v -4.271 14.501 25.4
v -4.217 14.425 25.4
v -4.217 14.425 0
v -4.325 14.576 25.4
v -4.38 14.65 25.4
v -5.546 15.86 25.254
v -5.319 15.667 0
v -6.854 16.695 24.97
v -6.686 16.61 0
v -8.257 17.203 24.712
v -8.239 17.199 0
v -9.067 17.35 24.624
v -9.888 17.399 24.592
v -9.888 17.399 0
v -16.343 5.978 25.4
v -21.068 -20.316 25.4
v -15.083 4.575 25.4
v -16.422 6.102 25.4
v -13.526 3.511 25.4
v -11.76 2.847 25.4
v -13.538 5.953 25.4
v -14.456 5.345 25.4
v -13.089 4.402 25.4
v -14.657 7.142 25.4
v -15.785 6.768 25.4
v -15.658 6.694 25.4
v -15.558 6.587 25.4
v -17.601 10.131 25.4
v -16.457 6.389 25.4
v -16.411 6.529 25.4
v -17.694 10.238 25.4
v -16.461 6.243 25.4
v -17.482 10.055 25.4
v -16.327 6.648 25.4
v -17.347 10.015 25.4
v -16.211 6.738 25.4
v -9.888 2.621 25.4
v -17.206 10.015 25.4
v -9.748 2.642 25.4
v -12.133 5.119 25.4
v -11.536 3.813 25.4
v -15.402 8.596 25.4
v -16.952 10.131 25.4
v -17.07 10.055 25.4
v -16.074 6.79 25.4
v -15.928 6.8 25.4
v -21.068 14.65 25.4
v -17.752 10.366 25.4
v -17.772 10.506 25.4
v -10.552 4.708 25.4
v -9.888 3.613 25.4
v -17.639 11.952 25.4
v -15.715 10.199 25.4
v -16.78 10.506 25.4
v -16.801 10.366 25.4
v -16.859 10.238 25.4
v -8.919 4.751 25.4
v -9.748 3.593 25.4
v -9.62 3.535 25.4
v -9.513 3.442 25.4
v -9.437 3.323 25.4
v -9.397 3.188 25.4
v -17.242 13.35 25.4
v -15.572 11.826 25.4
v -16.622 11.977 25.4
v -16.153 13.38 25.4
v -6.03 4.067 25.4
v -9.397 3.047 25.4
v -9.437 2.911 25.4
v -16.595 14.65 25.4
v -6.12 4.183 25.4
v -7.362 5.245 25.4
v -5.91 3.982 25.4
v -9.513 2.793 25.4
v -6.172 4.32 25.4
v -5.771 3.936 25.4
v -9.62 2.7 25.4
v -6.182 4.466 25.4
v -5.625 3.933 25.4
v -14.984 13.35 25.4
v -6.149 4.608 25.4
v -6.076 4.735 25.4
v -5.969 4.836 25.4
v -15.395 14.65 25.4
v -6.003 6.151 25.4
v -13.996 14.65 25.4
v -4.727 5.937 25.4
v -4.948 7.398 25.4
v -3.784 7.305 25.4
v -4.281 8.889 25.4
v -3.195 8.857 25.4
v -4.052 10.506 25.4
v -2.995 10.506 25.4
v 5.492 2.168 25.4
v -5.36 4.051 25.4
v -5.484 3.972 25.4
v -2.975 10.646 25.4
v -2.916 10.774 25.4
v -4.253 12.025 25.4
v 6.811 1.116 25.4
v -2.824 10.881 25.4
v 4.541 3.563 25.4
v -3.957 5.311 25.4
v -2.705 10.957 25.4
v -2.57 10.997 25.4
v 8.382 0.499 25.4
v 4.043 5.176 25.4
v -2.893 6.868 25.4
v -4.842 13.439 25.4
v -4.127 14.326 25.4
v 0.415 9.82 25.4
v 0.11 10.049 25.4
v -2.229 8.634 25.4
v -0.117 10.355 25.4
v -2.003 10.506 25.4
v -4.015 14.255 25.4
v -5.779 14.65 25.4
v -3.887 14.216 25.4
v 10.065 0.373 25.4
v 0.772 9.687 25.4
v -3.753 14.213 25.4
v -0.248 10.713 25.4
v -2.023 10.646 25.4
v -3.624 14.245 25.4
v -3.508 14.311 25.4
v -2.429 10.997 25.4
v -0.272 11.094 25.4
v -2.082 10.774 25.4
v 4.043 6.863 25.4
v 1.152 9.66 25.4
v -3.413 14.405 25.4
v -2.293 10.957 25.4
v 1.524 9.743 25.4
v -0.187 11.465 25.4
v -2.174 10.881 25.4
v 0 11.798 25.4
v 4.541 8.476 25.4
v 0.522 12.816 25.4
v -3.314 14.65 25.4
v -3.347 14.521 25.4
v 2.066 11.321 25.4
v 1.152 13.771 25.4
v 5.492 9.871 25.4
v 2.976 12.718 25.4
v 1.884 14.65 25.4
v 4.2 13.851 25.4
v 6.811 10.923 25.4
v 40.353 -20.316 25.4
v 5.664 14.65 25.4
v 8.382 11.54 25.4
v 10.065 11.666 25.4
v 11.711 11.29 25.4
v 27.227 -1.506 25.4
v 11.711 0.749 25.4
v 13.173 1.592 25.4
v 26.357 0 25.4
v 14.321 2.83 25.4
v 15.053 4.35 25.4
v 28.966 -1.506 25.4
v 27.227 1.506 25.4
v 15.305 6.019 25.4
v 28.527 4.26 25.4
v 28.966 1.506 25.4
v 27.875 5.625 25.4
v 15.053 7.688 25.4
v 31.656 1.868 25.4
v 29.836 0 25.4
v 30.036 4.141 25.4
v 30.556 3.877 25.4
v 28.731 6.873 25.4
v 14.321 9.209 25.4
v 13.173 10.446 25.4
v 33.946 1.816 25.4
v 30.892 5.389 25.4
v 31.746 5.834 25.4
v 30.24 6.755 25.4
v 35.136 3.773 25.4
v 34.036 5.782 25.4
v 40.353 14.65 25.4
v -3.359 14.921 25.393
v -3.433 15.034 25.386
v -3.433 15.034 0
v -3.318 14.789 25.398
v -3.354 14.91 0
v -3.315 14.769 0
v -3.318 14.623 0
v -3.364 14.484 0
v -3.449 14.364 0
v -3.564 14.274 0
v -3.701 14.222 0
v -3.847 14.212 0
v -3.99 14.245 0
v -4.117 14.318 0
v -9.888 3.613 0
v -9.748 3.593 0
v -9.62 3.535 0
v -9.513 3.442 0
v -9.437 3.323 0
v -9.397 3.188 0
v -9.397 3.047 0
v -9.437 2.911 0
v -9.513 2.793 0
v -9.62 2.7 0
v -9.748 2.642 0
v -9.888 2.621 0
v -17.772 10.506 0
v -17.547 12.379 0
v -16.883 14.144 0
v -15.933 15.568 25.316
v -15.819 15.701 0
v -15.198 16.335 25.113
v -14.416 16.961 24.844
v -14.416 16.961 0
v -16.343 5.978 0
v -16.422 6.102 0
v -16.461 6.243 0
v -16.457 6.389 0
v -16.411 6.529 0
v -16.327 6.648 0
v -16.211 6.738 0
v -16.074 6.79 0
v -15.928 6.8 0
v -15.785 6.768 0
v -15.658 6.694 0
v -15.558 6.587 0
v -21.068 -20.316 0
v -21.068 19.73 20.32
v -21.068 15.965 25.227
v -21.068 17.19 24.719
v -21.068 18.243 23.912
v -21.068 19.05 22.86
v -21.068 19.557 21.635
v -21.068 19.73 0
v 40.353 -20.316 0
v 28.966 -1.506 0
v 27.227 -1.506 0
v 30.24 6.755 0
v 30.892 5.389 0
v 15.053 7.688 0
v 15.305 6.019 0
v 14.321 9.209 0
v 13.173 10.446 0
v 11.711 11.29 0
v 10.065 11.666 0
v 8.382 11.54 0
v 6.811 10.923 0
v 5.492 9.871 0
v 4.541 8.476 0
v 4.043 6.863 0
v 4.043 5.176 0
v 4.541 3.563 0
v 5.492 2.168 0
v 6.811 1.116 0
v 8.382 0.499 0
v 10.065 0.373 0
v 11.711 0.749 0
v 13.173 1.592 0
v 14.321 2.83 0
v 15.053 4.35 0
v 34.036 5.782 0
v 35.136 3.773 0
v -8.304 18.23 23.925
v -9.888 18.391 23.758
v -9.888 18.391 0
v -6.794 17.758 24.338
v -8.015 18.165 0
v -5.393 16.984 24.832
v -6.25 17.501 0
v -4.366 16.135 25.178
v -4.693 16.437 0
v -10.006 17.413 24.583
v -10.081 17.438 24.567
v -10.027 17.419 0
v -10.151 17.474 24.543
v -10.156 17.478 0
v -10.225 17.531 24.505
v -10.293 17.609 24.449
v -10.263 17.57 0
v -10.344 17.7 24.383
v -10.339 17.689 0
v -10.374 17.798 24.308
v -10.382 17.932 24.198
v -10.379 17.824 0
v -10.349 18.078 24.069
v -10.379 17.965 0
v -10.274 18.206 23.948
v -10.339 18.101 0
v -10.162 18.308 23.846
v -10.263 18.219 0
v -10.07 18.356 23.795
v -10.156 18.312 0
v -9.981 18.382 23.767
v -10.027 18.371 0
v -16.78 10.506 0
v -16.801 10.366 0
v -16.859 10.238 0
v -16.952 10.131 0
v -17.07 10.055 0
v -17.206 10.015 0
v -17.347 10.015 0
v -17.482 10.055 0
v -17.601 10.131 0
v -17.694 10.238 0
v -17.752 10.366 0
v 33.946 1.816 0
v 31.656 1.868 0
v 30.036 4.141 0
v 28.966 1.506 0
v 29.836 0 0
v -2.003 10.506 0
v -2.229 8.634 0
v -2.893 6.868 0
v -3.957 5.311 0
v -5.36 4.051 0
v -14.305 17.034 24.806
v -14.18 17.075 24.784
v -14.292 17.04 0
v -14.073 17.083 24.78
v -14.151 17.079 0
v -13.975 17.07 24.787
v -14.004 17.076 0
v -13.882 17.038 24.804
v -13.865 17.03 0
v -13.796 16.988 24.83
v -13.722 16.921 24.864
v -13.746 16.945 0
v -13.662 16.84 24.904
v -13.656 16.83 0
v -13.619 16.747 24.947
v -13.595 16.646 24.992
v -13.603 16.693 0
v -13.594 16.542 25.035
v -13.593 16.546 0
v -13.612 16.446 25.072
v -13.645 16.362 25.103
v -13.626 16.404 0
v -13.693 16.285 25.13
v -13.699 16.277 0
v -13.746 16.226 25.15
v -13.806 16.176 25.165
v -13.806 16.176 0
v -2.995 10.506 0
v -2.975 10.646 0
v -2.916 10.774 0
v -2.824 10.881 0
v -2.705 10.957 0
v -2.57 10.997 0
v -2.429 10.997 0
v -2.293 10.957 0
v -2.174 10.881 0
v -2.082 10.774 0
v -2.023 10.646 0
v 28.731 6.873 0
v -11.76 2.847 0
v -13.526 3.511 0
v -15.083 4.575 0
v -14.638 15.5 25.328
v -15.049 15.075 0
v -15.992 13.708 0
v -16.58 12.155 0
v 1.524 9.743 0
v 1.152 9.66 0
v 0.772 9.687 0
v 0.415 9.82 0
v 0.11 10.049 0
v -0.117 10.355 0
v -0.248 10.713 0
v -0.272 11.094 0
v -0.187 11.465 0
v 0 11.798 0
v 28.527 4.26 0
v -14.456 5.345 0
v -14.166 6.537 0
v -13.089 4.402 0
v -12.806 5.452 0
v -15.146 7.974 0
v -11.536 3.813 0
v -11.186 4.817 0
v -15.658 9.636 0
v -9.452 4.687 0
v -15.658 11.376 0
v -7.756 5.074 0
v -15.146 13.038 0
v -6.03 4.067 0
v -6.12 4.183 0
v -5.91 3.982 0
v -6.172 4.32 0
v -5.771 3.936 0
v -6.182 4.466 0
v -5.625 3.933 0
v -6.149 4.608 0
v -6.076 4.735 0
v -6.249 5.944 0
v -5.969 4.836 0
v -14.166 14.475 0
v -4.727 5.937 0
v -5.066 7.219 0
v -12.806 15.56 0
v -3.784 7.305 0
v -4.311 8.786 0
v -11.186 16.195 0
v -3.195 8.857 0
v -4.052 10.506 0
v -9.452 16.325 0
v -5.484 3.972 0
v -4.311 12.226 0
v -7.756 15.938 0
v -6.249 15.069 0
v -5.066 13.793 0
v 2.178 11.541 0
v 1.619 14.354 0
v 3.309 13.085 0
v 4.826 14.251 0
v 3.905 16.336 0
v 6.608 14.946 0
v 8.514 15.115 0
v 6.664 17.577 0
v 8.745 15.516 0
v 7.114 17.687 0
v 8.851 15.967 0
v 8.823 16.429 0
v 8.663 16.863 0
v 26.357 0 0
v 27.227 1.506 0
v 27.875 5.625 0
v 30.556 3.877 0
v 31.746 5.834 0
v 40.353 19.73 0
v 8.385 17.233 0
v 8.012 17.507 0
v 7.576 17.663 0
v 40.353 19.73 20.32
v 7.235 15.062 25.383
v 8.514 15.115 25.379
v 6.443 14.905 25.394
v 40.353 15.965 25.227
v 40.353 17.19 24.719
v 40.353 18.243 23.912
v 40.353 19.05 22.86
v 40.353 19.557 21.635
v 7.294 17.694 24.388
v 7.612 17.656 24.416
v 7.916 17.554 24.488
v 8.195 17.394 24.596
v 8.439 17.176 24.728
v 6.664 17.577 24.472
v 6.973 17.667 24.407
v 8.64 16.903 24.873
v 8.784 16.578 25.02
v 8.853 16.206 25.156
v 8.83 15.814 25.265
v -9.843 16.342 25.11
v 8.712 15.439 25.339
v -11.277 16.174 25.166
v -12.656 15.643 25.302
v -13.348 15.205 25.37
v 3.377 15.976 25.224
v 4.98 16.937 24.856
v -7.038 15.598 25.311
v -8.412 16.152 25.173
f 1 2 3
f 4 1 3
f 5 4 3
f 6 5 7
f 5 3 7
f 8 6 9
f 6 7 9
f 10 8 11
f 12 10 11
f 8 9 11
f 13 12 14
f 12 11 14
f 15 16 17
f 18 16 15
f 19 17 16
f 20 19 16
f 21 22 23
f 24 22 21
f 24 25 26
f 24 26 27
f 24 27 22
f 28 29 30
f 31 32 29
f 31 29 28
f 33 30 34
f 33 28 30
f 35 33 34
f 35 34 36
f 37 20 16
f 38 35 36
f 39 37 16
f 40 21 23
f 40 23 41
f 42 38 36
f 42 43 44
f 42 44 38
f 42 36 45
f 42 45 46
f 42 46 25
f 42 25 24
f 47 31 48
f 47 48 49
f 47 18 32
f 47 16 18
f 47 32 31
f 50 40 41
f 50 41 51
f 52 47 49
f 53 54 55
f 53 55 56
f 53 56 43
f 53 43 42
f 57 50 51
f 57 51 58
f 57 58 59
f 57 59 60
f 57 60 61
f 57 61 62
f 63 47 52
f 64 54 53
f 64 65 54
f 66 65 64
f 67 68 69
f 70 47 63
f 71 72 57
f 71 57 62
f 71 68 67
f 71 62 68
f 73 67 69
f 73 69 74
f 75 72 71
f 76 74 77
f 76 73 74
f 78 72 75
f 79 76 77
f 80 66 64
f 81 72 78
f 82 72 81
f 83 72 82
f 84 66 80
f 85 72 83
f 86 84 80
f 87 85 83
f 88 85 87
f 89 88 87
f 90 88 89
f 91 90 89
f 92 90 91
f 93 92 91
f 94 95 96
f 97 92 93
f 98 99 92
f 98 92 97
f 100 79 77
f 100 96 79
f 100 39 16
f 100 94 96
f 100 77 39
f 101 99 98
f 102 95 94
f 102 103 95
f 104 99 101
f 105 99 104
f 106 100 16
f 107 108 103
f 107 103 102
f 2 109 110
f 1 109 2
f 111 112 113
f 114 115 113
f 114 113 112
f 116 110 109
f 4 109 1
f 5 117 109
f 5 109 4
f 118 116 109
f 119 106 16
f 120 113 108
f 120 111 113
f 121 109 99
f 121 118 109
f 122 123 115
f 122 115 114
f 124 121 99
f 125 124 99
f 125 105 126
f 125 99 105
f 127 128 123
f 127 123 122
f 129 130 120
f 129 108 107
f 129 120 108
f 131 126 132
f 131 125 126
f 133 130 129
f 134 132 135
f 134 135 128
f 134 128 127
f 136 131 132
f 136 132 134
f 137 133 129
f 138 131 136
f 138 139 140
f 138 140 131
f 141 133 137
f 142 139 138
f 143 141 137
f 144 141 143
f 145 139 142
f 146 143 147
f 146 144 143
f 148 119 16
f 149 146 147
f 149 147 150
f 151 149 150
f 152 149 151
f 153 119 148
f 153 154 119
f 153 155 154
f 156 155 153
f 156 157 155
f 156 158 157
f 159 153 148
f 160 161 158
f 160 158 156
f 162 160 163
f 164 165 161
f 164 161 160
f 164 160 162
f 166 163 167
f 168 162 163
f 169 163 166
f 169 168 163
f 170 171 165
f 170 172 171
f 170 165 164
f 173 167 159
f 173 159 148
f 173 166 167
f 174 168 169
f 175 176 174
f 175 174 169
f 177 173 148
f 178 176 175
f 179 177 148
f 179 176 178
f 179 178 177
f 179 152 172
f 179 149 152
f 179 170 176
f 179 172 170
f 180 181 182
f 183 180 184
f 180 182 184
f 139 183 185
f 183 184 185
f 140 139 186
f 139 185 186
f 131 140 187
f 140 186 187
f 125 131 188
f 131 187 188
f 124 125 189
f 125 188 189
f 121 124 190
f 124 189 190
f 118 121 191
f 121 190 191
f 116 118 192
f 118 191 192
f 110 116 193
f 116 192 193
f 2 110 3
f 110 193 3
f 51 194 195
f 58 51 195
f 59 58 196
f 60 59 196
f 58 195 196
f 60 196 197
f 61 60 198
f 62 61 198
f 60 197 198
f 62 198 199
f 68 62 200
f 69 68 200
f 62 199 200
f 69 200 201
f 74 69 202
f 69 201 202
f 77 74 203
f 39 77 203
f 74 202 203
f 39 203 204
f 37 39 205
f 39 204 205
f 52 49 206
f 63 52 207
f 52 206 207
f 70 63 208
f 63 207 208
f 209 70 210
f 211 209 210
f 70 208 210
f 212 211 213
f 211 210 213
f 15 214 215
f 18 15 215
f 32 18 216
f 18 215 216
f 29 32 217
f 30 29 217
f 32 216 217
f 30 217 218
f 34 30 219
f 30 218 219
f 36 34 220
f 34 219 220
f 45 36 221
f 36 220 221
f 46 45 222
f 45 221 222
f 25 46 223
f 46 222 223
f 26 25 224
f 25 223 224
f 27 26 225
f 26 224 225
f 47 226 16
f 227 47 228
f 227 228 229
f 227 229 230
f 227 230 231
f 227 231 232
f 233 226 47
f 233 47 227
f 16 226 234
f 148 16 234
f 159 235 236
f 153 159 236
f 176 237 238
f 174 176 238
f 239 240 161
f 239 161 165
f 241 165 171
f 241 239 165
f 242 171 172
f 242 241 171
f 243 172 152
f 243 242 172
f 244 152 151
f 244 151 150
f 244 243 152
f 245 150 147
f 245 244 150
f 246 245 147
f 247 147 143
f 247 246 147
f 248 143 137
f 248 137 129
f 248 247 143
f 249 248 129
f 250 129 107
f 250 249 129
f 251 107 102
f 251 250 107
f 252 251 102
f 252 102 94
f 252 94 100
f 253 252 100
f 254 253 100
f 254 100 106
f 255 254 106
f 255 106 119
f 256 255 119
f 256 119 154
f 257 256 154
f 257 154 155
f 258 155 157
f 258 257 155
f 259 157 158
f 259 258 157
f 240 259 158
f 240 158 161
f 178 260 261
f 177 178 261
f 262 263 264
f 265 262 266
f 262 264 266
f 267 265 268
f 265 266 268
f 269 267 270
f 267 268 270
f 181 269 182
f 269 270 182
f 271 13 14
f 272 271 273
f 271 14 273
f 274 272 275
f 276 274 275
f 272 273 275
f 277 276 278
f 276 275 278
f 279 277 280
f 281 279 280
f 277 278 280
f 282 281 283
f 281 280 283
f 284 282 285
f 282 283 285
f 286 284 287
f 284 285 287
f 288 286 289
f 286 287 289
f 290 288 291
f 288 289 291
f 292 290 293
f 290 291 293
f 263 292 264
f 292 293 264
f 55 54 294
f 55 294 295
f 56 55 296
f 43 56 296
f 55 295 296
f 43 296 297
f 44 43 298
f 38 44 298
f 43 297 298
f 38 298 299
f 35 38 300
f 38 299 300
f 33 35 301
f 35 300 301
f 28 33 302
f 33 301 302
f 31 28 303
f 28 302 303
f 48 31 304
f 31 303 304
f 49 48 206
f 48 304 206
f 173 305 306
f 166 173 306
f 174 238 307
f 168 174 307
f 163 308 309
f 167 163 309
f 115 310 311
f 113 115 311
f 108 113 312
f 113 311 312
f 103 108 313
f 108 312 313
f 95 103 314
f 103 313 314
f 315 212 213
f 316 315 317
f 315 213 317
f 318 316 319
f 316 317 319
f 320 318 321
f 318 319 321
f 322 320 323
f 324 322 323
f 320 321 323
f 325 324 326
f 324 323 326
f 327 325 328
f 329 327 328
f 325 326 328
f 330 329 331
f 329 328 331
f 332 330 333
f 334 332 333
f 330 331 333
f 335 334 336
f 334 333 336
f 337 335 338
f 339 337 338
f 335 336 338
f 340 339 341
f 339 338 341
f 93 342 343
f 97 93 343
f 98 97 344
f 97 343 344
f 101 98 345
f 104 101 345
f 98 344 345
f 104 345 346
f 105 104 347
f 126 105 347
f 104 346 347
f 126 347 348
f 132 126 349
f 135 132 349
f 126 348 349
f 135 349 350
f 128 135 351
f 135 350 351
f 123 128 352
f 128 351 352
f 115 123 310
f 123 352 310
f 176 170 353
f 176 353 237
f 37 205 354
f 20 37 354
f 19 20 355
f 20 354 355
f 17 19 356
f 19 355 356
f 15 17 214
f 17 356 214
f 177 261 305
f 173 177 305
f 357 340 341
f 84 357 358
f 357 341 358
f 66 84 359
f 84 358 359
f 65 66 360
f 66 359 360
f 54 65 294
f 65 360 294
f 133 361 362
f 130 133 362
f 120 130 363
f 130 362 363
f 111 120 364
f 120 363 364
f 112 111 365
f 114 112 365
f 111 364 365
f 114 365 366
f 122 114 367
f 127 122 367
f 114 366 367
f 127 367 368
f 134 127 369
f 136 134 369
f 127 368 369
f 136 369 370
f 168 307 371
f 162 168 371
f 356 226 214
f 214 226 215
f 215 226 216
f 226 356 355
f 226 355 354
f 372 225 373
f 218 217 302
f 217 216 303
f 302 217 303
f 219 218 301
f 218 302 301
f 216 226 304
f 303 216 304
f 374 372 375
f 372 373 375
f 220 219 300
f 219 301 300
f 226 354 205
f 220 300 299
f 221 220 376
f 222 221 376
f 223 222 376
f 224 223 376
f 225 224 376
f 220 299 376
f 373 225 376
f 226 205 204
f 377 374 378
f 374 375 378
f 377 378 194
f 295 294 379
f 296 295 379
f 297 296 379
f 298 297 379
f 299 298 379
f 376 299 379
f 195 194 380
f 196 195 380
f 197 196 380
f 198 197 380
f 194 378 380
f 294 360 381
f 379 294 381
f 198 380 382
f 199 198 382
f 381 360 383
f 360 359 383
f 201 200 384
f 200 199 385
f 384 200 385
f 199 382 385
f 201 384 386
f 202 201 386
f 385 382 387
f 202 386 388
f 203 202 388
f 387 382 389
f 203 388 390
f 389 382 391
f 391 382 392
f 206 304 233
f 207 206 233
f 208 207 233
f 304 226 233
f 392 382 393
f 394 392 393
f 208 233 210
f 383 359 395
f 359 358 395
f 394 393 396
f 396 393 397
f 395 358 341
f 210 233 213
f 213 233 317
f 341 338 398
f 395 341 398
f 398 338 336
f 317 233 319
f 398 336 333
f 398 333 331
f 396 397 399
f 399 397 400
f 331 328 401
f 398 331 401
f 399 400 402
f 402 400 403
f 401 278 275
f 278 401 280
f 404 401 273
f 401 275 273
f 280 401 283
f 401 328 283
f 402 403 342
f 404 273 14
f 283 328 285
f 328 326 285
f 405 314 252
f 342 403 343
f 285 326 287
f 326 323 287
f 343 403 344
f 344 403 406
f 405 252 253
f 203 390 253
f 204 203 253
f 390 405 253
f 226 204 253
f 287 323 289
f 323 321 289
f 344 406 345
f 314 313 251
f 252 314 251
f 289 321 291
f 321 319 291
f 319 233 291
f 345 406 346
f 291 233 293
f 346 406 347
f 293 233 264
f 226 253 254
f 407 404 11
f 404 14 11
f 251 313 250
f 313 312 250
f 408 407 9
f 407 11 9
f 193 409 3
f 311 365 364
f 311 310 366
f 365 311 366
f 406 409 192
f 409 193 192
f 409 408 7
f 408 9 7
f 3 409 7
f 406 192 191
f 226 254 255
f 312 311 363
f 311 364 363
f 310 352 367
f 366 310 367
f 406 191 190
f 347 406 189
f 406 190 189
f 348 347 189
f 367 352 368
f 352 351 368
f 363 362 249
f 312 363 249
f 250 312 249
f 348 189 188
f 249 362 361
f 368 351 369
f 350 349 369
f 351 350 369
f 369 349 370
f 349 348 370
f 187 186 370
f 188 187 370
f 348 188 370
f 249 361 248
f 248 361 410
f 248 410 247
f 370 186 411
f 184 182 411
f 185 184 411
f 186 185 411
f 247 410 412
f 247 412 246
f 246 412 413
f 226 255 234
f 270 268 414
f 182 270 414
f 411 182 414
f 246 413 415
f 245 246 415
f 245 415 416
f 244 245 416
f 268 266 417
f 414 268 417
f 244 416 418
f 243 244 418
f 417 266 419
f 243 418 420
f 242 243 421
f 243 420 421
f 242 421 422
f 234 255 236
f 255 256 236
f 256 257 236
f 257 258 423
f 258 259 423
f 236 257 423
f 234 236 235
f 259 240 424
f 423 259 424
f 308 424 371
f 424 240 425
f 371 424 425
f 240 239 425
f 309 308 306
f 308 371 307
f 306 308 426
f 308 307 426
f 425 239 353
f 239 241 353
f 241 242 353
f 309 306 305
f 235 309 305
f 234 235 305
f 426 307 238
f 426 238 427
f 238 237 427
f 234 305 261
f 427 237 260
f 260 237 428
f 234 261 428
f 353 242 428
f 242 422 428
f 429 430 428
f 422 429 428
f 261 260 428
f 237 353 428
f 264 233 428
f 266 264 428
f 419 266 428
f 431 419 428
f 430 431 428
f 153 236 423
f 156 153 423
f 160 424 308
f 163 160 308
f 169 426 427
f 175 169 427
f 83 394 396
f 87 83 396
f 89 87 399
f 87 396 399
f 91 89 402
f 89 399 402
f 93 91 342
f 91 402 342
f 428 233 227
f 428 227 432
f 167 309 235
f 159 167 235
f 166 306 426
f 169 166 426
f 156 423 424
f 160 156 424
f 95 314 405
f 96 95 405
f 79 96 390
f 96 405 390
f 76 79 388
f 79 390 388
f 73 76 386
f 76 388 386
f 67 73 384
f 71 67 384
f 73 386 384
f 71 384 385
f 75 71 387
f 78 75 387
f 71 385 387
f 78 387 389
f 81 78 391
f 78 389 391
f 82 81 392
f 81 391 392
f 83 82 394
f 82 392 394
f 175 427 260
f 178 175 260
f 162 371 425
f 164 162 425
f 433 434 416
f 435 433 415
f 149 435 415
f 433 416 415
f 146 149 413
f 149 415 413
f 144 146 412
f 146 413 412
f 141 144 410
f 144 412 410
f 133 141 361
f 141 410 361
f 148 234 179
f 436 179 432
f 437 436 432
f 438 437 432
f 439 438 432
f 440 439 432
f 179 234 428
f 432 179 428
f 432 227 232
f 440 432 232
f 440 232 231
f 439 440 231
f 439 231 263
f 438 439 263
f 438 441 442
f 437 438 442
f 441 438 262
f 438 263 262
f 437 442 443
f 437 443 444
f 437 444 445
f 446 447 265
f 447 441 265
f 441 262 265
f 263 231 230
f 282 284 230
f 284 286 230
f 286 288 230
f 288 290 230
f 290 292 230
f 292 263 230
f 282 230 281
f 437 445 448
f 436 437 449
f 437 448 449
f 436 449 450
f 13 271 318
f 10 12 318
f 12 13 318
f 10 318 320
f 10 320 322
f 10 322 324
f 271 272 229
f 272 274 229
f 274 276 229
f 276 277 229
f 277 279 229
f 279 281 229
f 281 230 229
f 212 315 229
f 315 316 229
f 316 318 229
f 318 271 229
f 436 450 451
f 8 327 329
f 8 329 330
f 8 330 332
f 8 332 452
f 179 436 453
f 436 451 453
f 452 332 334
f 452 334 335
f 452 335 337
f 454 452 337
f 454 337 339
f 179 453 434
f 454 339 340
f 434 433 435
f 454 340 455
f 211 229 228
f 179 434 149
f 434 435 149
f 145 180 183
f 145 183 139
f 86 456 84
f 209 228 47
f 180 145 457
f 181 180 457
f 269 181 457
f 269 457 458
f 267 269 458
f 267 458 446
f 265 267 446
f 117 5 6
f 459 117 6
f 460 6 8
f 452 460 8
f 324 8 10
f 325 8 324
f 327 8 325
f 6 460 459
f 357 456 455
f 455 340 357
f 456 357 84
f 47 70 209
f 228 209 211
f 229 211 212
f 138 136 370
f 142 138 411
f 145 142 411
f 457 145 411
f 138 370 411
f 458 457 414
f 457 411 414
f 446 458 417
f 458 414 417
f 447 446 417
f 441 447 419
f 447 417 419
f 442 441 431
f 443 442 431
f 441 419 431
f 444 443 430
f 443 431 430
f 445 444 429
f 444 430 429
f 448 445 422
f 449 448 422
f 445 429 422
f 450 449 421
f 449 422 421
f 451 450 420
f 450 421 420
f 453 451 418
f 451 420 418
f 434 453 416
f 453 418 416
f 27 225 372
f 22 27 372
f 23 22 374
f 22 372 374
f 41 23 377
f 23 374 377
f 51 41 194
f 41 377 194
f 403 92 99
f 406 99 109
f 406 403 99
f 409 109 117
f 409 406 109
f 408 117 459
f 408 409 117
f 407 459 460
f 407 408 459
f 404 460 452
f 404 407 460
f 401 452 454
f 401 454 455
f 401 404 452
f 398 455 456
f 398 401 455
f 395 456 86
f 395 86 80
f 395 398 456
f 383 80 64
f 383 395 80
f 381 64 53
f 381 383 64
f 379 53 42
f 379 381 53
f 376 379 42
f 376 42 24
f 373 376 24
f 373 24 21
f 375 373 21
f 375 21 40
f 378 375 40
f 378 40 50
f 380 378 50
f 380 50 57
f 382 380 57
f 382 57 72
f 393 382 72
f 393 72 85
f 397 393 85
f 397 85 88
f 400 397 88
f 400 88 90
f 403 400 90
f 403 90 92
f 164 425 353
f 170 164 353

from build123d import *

# Parameters (mm, degrees)
F0_W        = 61.4208132029
F0_H        = 40.0461480021
F0_R        = 5.8356598506
F0_R_2      = 5.6623382773
F1_DEPTH    = 25.4
F2_T1_DEPTH = 86.8208132029


# Not quite as in the source:
# - a fillet or chamfer that OpenCascade refuses, or shapes differently, is made with other operations: its cross-section is extruded or revolved along the edge and cut away or added


with BuildPart() as f1:
    # F0 (on Top) → F1 (new body)
    with BuildSketch(Plane.XY):
        with Locations((9.6422955394, -0.2926178277)):
            Rectangle(F0_W, F0_H)
        with BuildLine():
            ThreePointArc((-15.5581902422, 6.5874267261), (-13.0892777006, 4.4019793182), (-9.8877530545, 3.6133415997))
            ThreePointArc((-9.8877530545, 3.6133415997), (-9.3918088824, 3.1173974276), (-9.8877530545, 2.6214532554))
            ThreePointArc((-9.8877530545, 2.6214532554), (-13.525571131, 3.5108261592), (-16.3427069667, 5.9783046702))
            ThreePointArc((-16.3427069667, 5.9783046702), (-16.2723997648, 6.6975216235), (-15.5581902422, 6.5874267261))
        make_face(mode=Mode.SUBTRACT)
        with BuildLine():
            ThreePointArc((-5.9691235315, 4.8356190614), (-3.7836761236, 7.304531603), (-2.9950384051, 10.5060562491))
            ThreePointArc((-2.9950384051, 10.5060562491), (-2.4990942329, 11.0020004213), (-2.0031500608, 10.5060562491))
            ThreePointArc((-2.0031500608, 10.5060562491), (-2.8925229646, 6.8682381727), (-5.3600014756, 4.051102337))
            ThreePointArc((-5.3600014756, 4.051102337), (-6.0792184289, 4.1214095389), (-5.9691235315, 4.8356190614))
        make_face(mode=Mode.SUBTRACT)
        with BuildLine():
            ThreePointArc((-13.8063825775, 16.1764934369), (-15.9918299854, 13.7075808953), (-16.7804677039, 10.5060562491))
            ThreePointArc((-16.7804677039, 10.5060562491), (-17.2764118761, 10.010112077), (-17.7723560482, 10.5060562491))
            ThreePointArc((-17.7723560482, 10.5060562491), (-16.8829831444, 14.1438743256), (-14.4155046334, 16.9610101613))
            ThreePointArc((-14.4155046334, 16.9610101613), (-13.6962876801, 16.8907029594), (-13.8063825775, 16.1764934369))
        make_face(mode=Mode.SUBTRACT)
        with Locations((-9.8877530545, 10.5060562491)):
            Circle(F0_R, mode=Mode.SUBTRACT)
        with BuildLine():
            ThreePointArc((-9.8877530545, 17.3987708986), (-10.3836972266, 17.8947150707), (-9.8877530545, 18.3906592429))
            ThreePointArc((-9.8877530545, 18.3906592429), (-6.249934978, 17.5012863391), (-3.4327991423, 15.0338078281))
            ThreePointArc((-3.4327991423, 15.0338078281), (-3.5031063442, 14.3145908748), (-4.2173158668, 14.4246857722))
            ThreePointArc((-4.2173158668, 14.4246857722), (-6.6862284084, 16.6101331801), (-9.8877530545, 17.3987708986))
        make_face(mode=Mode.SUBTRACT)
        with BuildLine():
            ThreePointArc((6.6644512117, 17.5767932087), (8.5373270865, 17.0581119265), (8.5140671581, 15.1148792356))
            ThreePointArc((8.5140671581, 15.1148792356), (4.0257871944, 13.7216332626), (1.5243776143, 9.7430981696))
            ThreePointArc((1.5243776143, 9.7430981696), (-0.0147844439, 10.1939229676), (0, 11.7976823822))
            ThreePointArc((0, 11.7976823822), (2.6892272592, 15.4287413311), (6.6644512117, 17.5767932087))
        make_face(mode=Mode.SUBTRACT)
        with Locations((9.6422955394, 6.0194581747)):
            Circle(F0_R_2, mode=Mode.SUBTRACT)
        Polygon((28.9662275463, 1.5064948219), (29.8360027373, 0), (28.9662275463, -1.5064948219), (27.2266771644, -1.5064948219), (26.3569019735, 0), (27.2266771644, 1.5064948219), align=None, mode=Mode.SUBTRACT)
        Polygon((33.9459068477, 1.8158181313), (31.6559560597, 1.8676351756), (30.5558555424, 3.8766992536), (31.7457058131, 5.8339462873), (34.0356566012, 5.782129243), (35.1357571185, 3.773065165), align=None, mode=Mode.SUBTRACT)
        Polygon((30.2401456875, 6.7547236703), (30.8922100812, 5.3890366107), (30.0355225909, 4.141488751), (28.5267707068, 4.259627951), (27.874706313, 5.6253150105), (28.7313938034, 6.8728628702), align=None, mode=Mode.SUBTRACT)
    extrude(amount=F1_DEPTH)

    # F2: fillet of radius 5.08 on 1 edges, made by hand

    # F2_s2 → F2_t1 (cut)
    with BuildSketch(Plane.YZ.offset(-33.768111062)):
        with BuildLine():
            ThreePointArc((19.7304561734, 20.32), (18.2425586218, 23.9121024484), (14.6504561734, 25.4))
            Line((14.6504561734, 25.4), (19.7304561734, 25.4))
            Line((19.7304561734, 25.4), (19.7304561734, 20.32))
        make_face()
    extrude(amount=F2_T1_DEPTH, mode=Mode.SUBTRACT)


solid = f1.part
